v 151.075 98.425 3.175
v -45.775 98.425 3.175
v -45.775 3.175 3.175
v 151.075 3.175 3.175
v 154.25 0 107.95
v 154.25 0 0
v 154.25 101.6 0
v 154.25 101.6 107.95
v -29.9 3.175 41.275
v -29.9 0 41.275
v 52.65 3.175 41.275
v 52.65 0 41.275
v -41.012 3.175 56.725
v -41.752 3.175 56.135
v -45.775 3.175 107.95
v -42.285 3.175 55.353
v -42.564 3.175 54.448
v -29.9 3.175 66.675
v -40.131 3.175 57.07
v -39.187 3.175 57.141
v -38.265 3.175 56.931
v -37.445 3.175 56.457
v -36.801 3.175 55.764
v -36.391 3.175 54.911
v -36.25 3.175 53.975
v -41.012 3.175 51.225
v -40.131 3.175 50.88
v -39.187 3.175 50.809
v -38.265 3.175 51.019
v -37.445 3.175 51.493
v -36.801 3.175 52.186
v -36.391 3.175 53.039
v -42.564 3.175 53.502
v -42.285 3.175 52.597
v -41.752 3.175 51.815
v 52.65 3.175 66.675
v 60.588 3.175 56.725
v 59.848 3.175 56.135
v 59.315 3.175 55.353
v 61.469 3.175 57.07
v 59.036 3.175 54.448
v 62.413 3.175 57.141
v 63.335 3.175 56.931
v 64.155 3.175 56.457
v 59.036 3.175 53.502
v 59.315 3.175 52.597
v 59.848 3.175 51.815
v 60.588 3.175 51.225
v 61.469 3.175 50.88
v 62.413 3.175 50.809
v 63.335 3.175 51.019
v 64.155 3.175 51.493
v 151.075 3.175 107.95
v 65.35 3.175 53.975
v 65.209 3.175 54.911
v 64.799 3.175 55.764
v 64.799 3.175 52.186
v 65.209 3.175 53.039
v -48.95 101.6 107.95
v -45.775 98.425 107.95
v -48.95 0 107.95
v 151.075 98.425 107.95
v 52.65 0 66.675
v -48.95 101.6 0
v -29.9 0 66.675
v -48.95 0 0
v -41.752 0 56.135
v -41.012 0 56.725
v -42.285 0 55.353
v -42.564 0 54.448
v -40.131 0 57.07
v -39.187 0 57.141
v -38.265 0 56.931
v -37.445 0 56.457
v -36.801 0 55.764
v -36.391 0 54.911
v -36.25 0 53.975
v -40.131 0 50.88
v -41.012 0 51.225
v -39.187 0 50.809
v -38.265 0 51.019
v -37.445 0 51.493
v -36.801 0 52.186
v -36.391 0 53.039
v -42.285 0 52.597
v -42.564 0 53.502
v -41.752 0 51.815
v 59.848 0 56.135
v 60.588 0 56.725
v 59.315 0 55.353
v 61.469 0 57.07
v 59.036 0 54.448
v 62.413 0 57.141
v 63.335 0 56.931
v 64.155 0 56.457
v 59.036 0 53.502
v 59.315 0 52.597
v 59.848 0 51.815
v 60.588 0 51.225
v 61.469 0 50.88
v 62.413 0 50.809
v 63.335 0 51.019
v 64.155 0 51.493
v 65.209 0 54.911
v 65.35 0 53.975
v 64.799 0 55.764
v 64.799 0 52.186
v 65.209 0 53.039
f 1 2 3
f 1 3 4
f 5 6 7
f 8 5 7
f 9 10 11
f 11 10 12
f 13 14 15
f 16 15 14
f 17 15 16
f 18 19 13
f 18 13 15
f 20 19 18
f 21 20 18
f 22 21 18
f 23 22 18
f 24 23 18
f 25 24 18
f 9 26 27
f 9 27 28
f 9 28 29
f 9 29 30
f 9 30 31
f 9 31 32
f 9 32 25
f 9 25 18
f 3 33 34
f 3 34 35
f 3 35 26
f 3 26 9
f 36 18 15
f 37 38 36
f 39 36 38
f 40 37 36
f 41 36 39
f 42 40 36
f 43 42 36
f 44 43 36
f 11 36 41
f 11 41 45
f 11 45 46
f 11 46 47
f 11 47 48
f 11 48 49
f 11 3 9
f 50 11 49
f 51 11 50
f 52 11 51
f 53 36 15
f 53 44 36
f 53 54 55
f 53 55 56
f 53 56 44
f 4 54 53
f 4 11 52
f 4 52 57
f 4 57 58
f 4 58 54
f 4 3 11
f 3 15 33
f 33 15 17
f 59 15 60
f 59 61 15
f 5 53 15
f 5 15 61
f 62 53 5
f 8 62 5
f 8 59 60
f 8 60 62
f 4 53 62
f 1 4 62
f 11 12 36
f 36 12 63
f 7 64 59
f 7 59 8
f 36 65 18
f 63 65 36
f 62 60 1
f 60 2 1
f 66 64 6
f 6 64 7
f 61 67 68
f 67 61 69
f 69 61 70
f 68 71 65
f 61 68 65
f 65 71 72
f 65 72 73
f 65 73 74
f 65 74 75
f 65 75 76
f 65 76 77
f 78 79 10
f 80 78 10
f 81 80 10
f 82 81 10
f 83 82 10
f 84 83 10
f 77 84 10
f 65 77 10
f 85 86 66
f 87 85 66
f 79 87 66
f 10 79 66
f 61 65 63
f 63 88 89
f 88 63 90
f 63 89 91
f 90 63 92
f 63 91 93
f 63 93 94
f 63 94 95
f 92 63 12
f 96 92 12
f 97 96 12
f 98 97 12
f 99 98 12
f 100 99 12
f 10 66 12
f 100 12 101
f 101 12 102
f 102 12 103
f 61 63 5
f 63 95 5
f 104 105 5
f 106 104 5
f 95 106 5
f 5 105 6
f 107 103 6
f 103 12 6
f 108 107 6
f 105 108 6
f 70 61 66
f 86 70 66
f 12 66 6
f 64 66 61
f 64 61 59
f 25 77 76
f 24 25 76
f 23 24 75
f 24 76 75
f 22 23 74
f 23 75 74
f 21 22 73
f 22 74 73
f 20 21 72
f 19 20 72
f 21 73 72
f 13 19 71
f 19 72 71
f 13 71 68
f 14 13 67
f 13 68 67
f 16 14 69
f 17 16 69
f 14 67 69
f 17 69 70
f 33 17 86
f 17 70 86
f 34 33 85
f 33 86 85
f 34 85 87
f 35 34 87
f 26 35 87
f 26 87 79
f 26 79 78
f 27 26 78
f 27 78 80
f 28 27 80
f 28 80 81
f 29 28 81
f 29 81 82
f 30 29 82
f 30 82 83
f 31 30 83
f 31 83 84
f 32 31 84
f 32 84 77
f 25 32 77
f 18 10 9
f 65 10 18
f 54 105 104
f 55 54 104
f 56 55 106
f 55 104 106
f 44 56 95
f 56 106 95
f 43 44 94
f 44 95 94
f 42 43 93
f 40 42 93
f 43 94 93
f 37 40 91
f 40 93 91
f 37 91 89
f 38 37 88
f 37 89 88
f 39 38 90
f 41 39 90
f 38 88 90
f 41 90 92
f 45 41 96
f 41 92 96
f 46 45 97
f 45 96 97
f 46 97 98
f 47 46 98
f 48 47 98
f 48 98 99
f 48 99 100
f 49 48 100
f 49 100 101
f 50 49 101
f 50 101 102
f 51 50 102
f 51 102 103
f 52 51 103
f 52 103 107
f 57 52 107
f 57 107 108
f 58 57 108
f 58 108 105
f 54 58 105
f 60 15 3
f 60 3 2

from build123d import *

# Parameters (mm, degrees)
F0_W     = 203.2
F0_H     = 101.6
F1_DEPTH = 107.95
F2_T     = -3.175
F3_W     = 82.55
F3_H     = 25.4
F4_DEPTH = 25.4
F6_R     = 3.175
F7_DEPTH = 25.4
F8_R     = 3.175
F9_DEPTH = 25.4


with BuildPart() as f1:
    # F0 (on Top) → F1 (new body)
    with BuildSketch(Plane.XY):
        with Locations((52.650332, 50.8)):
            Rectangle(F0_W, F0_H)
    extrude(amount=F1_DEPTH)

    # F2
    f2_openings = [f1.faces().sort_by_distance(p)[0] for p in [
        (52.650332, 50.8, 107.95),
    ]]
    offset(amount=F2_T, openings=f2_openings)

    # F3 (on Front) → F4 (cut)
    with BuildSketch(Plane.XZ):
        with Locations((11.375332, 53.975)):
            Rectangle(F3_W, F3_H)
    extrude(amount=-F4_DEPTH, mode=Mode.SUBTRACT)

    # F6 (on Front) → F7 (cut)
    with BuildSketch(Plane.XZ):
        with Locations((-39.424668, 53.975)):
            Circle(F6_R)
    extrude(amount=-F7_DEPTH, mode=Mode.SUBTRACT)

    # F8 (on Front) → F9 (cut)
    with BuildSketch(Plane.XZ):
        with Locations((62.175332, 53.975)):
            Circle(F8_R)
    extrude(amount=-F9_DEPTH, mode=Mode.SUBTRACT)


solid = f1.part
